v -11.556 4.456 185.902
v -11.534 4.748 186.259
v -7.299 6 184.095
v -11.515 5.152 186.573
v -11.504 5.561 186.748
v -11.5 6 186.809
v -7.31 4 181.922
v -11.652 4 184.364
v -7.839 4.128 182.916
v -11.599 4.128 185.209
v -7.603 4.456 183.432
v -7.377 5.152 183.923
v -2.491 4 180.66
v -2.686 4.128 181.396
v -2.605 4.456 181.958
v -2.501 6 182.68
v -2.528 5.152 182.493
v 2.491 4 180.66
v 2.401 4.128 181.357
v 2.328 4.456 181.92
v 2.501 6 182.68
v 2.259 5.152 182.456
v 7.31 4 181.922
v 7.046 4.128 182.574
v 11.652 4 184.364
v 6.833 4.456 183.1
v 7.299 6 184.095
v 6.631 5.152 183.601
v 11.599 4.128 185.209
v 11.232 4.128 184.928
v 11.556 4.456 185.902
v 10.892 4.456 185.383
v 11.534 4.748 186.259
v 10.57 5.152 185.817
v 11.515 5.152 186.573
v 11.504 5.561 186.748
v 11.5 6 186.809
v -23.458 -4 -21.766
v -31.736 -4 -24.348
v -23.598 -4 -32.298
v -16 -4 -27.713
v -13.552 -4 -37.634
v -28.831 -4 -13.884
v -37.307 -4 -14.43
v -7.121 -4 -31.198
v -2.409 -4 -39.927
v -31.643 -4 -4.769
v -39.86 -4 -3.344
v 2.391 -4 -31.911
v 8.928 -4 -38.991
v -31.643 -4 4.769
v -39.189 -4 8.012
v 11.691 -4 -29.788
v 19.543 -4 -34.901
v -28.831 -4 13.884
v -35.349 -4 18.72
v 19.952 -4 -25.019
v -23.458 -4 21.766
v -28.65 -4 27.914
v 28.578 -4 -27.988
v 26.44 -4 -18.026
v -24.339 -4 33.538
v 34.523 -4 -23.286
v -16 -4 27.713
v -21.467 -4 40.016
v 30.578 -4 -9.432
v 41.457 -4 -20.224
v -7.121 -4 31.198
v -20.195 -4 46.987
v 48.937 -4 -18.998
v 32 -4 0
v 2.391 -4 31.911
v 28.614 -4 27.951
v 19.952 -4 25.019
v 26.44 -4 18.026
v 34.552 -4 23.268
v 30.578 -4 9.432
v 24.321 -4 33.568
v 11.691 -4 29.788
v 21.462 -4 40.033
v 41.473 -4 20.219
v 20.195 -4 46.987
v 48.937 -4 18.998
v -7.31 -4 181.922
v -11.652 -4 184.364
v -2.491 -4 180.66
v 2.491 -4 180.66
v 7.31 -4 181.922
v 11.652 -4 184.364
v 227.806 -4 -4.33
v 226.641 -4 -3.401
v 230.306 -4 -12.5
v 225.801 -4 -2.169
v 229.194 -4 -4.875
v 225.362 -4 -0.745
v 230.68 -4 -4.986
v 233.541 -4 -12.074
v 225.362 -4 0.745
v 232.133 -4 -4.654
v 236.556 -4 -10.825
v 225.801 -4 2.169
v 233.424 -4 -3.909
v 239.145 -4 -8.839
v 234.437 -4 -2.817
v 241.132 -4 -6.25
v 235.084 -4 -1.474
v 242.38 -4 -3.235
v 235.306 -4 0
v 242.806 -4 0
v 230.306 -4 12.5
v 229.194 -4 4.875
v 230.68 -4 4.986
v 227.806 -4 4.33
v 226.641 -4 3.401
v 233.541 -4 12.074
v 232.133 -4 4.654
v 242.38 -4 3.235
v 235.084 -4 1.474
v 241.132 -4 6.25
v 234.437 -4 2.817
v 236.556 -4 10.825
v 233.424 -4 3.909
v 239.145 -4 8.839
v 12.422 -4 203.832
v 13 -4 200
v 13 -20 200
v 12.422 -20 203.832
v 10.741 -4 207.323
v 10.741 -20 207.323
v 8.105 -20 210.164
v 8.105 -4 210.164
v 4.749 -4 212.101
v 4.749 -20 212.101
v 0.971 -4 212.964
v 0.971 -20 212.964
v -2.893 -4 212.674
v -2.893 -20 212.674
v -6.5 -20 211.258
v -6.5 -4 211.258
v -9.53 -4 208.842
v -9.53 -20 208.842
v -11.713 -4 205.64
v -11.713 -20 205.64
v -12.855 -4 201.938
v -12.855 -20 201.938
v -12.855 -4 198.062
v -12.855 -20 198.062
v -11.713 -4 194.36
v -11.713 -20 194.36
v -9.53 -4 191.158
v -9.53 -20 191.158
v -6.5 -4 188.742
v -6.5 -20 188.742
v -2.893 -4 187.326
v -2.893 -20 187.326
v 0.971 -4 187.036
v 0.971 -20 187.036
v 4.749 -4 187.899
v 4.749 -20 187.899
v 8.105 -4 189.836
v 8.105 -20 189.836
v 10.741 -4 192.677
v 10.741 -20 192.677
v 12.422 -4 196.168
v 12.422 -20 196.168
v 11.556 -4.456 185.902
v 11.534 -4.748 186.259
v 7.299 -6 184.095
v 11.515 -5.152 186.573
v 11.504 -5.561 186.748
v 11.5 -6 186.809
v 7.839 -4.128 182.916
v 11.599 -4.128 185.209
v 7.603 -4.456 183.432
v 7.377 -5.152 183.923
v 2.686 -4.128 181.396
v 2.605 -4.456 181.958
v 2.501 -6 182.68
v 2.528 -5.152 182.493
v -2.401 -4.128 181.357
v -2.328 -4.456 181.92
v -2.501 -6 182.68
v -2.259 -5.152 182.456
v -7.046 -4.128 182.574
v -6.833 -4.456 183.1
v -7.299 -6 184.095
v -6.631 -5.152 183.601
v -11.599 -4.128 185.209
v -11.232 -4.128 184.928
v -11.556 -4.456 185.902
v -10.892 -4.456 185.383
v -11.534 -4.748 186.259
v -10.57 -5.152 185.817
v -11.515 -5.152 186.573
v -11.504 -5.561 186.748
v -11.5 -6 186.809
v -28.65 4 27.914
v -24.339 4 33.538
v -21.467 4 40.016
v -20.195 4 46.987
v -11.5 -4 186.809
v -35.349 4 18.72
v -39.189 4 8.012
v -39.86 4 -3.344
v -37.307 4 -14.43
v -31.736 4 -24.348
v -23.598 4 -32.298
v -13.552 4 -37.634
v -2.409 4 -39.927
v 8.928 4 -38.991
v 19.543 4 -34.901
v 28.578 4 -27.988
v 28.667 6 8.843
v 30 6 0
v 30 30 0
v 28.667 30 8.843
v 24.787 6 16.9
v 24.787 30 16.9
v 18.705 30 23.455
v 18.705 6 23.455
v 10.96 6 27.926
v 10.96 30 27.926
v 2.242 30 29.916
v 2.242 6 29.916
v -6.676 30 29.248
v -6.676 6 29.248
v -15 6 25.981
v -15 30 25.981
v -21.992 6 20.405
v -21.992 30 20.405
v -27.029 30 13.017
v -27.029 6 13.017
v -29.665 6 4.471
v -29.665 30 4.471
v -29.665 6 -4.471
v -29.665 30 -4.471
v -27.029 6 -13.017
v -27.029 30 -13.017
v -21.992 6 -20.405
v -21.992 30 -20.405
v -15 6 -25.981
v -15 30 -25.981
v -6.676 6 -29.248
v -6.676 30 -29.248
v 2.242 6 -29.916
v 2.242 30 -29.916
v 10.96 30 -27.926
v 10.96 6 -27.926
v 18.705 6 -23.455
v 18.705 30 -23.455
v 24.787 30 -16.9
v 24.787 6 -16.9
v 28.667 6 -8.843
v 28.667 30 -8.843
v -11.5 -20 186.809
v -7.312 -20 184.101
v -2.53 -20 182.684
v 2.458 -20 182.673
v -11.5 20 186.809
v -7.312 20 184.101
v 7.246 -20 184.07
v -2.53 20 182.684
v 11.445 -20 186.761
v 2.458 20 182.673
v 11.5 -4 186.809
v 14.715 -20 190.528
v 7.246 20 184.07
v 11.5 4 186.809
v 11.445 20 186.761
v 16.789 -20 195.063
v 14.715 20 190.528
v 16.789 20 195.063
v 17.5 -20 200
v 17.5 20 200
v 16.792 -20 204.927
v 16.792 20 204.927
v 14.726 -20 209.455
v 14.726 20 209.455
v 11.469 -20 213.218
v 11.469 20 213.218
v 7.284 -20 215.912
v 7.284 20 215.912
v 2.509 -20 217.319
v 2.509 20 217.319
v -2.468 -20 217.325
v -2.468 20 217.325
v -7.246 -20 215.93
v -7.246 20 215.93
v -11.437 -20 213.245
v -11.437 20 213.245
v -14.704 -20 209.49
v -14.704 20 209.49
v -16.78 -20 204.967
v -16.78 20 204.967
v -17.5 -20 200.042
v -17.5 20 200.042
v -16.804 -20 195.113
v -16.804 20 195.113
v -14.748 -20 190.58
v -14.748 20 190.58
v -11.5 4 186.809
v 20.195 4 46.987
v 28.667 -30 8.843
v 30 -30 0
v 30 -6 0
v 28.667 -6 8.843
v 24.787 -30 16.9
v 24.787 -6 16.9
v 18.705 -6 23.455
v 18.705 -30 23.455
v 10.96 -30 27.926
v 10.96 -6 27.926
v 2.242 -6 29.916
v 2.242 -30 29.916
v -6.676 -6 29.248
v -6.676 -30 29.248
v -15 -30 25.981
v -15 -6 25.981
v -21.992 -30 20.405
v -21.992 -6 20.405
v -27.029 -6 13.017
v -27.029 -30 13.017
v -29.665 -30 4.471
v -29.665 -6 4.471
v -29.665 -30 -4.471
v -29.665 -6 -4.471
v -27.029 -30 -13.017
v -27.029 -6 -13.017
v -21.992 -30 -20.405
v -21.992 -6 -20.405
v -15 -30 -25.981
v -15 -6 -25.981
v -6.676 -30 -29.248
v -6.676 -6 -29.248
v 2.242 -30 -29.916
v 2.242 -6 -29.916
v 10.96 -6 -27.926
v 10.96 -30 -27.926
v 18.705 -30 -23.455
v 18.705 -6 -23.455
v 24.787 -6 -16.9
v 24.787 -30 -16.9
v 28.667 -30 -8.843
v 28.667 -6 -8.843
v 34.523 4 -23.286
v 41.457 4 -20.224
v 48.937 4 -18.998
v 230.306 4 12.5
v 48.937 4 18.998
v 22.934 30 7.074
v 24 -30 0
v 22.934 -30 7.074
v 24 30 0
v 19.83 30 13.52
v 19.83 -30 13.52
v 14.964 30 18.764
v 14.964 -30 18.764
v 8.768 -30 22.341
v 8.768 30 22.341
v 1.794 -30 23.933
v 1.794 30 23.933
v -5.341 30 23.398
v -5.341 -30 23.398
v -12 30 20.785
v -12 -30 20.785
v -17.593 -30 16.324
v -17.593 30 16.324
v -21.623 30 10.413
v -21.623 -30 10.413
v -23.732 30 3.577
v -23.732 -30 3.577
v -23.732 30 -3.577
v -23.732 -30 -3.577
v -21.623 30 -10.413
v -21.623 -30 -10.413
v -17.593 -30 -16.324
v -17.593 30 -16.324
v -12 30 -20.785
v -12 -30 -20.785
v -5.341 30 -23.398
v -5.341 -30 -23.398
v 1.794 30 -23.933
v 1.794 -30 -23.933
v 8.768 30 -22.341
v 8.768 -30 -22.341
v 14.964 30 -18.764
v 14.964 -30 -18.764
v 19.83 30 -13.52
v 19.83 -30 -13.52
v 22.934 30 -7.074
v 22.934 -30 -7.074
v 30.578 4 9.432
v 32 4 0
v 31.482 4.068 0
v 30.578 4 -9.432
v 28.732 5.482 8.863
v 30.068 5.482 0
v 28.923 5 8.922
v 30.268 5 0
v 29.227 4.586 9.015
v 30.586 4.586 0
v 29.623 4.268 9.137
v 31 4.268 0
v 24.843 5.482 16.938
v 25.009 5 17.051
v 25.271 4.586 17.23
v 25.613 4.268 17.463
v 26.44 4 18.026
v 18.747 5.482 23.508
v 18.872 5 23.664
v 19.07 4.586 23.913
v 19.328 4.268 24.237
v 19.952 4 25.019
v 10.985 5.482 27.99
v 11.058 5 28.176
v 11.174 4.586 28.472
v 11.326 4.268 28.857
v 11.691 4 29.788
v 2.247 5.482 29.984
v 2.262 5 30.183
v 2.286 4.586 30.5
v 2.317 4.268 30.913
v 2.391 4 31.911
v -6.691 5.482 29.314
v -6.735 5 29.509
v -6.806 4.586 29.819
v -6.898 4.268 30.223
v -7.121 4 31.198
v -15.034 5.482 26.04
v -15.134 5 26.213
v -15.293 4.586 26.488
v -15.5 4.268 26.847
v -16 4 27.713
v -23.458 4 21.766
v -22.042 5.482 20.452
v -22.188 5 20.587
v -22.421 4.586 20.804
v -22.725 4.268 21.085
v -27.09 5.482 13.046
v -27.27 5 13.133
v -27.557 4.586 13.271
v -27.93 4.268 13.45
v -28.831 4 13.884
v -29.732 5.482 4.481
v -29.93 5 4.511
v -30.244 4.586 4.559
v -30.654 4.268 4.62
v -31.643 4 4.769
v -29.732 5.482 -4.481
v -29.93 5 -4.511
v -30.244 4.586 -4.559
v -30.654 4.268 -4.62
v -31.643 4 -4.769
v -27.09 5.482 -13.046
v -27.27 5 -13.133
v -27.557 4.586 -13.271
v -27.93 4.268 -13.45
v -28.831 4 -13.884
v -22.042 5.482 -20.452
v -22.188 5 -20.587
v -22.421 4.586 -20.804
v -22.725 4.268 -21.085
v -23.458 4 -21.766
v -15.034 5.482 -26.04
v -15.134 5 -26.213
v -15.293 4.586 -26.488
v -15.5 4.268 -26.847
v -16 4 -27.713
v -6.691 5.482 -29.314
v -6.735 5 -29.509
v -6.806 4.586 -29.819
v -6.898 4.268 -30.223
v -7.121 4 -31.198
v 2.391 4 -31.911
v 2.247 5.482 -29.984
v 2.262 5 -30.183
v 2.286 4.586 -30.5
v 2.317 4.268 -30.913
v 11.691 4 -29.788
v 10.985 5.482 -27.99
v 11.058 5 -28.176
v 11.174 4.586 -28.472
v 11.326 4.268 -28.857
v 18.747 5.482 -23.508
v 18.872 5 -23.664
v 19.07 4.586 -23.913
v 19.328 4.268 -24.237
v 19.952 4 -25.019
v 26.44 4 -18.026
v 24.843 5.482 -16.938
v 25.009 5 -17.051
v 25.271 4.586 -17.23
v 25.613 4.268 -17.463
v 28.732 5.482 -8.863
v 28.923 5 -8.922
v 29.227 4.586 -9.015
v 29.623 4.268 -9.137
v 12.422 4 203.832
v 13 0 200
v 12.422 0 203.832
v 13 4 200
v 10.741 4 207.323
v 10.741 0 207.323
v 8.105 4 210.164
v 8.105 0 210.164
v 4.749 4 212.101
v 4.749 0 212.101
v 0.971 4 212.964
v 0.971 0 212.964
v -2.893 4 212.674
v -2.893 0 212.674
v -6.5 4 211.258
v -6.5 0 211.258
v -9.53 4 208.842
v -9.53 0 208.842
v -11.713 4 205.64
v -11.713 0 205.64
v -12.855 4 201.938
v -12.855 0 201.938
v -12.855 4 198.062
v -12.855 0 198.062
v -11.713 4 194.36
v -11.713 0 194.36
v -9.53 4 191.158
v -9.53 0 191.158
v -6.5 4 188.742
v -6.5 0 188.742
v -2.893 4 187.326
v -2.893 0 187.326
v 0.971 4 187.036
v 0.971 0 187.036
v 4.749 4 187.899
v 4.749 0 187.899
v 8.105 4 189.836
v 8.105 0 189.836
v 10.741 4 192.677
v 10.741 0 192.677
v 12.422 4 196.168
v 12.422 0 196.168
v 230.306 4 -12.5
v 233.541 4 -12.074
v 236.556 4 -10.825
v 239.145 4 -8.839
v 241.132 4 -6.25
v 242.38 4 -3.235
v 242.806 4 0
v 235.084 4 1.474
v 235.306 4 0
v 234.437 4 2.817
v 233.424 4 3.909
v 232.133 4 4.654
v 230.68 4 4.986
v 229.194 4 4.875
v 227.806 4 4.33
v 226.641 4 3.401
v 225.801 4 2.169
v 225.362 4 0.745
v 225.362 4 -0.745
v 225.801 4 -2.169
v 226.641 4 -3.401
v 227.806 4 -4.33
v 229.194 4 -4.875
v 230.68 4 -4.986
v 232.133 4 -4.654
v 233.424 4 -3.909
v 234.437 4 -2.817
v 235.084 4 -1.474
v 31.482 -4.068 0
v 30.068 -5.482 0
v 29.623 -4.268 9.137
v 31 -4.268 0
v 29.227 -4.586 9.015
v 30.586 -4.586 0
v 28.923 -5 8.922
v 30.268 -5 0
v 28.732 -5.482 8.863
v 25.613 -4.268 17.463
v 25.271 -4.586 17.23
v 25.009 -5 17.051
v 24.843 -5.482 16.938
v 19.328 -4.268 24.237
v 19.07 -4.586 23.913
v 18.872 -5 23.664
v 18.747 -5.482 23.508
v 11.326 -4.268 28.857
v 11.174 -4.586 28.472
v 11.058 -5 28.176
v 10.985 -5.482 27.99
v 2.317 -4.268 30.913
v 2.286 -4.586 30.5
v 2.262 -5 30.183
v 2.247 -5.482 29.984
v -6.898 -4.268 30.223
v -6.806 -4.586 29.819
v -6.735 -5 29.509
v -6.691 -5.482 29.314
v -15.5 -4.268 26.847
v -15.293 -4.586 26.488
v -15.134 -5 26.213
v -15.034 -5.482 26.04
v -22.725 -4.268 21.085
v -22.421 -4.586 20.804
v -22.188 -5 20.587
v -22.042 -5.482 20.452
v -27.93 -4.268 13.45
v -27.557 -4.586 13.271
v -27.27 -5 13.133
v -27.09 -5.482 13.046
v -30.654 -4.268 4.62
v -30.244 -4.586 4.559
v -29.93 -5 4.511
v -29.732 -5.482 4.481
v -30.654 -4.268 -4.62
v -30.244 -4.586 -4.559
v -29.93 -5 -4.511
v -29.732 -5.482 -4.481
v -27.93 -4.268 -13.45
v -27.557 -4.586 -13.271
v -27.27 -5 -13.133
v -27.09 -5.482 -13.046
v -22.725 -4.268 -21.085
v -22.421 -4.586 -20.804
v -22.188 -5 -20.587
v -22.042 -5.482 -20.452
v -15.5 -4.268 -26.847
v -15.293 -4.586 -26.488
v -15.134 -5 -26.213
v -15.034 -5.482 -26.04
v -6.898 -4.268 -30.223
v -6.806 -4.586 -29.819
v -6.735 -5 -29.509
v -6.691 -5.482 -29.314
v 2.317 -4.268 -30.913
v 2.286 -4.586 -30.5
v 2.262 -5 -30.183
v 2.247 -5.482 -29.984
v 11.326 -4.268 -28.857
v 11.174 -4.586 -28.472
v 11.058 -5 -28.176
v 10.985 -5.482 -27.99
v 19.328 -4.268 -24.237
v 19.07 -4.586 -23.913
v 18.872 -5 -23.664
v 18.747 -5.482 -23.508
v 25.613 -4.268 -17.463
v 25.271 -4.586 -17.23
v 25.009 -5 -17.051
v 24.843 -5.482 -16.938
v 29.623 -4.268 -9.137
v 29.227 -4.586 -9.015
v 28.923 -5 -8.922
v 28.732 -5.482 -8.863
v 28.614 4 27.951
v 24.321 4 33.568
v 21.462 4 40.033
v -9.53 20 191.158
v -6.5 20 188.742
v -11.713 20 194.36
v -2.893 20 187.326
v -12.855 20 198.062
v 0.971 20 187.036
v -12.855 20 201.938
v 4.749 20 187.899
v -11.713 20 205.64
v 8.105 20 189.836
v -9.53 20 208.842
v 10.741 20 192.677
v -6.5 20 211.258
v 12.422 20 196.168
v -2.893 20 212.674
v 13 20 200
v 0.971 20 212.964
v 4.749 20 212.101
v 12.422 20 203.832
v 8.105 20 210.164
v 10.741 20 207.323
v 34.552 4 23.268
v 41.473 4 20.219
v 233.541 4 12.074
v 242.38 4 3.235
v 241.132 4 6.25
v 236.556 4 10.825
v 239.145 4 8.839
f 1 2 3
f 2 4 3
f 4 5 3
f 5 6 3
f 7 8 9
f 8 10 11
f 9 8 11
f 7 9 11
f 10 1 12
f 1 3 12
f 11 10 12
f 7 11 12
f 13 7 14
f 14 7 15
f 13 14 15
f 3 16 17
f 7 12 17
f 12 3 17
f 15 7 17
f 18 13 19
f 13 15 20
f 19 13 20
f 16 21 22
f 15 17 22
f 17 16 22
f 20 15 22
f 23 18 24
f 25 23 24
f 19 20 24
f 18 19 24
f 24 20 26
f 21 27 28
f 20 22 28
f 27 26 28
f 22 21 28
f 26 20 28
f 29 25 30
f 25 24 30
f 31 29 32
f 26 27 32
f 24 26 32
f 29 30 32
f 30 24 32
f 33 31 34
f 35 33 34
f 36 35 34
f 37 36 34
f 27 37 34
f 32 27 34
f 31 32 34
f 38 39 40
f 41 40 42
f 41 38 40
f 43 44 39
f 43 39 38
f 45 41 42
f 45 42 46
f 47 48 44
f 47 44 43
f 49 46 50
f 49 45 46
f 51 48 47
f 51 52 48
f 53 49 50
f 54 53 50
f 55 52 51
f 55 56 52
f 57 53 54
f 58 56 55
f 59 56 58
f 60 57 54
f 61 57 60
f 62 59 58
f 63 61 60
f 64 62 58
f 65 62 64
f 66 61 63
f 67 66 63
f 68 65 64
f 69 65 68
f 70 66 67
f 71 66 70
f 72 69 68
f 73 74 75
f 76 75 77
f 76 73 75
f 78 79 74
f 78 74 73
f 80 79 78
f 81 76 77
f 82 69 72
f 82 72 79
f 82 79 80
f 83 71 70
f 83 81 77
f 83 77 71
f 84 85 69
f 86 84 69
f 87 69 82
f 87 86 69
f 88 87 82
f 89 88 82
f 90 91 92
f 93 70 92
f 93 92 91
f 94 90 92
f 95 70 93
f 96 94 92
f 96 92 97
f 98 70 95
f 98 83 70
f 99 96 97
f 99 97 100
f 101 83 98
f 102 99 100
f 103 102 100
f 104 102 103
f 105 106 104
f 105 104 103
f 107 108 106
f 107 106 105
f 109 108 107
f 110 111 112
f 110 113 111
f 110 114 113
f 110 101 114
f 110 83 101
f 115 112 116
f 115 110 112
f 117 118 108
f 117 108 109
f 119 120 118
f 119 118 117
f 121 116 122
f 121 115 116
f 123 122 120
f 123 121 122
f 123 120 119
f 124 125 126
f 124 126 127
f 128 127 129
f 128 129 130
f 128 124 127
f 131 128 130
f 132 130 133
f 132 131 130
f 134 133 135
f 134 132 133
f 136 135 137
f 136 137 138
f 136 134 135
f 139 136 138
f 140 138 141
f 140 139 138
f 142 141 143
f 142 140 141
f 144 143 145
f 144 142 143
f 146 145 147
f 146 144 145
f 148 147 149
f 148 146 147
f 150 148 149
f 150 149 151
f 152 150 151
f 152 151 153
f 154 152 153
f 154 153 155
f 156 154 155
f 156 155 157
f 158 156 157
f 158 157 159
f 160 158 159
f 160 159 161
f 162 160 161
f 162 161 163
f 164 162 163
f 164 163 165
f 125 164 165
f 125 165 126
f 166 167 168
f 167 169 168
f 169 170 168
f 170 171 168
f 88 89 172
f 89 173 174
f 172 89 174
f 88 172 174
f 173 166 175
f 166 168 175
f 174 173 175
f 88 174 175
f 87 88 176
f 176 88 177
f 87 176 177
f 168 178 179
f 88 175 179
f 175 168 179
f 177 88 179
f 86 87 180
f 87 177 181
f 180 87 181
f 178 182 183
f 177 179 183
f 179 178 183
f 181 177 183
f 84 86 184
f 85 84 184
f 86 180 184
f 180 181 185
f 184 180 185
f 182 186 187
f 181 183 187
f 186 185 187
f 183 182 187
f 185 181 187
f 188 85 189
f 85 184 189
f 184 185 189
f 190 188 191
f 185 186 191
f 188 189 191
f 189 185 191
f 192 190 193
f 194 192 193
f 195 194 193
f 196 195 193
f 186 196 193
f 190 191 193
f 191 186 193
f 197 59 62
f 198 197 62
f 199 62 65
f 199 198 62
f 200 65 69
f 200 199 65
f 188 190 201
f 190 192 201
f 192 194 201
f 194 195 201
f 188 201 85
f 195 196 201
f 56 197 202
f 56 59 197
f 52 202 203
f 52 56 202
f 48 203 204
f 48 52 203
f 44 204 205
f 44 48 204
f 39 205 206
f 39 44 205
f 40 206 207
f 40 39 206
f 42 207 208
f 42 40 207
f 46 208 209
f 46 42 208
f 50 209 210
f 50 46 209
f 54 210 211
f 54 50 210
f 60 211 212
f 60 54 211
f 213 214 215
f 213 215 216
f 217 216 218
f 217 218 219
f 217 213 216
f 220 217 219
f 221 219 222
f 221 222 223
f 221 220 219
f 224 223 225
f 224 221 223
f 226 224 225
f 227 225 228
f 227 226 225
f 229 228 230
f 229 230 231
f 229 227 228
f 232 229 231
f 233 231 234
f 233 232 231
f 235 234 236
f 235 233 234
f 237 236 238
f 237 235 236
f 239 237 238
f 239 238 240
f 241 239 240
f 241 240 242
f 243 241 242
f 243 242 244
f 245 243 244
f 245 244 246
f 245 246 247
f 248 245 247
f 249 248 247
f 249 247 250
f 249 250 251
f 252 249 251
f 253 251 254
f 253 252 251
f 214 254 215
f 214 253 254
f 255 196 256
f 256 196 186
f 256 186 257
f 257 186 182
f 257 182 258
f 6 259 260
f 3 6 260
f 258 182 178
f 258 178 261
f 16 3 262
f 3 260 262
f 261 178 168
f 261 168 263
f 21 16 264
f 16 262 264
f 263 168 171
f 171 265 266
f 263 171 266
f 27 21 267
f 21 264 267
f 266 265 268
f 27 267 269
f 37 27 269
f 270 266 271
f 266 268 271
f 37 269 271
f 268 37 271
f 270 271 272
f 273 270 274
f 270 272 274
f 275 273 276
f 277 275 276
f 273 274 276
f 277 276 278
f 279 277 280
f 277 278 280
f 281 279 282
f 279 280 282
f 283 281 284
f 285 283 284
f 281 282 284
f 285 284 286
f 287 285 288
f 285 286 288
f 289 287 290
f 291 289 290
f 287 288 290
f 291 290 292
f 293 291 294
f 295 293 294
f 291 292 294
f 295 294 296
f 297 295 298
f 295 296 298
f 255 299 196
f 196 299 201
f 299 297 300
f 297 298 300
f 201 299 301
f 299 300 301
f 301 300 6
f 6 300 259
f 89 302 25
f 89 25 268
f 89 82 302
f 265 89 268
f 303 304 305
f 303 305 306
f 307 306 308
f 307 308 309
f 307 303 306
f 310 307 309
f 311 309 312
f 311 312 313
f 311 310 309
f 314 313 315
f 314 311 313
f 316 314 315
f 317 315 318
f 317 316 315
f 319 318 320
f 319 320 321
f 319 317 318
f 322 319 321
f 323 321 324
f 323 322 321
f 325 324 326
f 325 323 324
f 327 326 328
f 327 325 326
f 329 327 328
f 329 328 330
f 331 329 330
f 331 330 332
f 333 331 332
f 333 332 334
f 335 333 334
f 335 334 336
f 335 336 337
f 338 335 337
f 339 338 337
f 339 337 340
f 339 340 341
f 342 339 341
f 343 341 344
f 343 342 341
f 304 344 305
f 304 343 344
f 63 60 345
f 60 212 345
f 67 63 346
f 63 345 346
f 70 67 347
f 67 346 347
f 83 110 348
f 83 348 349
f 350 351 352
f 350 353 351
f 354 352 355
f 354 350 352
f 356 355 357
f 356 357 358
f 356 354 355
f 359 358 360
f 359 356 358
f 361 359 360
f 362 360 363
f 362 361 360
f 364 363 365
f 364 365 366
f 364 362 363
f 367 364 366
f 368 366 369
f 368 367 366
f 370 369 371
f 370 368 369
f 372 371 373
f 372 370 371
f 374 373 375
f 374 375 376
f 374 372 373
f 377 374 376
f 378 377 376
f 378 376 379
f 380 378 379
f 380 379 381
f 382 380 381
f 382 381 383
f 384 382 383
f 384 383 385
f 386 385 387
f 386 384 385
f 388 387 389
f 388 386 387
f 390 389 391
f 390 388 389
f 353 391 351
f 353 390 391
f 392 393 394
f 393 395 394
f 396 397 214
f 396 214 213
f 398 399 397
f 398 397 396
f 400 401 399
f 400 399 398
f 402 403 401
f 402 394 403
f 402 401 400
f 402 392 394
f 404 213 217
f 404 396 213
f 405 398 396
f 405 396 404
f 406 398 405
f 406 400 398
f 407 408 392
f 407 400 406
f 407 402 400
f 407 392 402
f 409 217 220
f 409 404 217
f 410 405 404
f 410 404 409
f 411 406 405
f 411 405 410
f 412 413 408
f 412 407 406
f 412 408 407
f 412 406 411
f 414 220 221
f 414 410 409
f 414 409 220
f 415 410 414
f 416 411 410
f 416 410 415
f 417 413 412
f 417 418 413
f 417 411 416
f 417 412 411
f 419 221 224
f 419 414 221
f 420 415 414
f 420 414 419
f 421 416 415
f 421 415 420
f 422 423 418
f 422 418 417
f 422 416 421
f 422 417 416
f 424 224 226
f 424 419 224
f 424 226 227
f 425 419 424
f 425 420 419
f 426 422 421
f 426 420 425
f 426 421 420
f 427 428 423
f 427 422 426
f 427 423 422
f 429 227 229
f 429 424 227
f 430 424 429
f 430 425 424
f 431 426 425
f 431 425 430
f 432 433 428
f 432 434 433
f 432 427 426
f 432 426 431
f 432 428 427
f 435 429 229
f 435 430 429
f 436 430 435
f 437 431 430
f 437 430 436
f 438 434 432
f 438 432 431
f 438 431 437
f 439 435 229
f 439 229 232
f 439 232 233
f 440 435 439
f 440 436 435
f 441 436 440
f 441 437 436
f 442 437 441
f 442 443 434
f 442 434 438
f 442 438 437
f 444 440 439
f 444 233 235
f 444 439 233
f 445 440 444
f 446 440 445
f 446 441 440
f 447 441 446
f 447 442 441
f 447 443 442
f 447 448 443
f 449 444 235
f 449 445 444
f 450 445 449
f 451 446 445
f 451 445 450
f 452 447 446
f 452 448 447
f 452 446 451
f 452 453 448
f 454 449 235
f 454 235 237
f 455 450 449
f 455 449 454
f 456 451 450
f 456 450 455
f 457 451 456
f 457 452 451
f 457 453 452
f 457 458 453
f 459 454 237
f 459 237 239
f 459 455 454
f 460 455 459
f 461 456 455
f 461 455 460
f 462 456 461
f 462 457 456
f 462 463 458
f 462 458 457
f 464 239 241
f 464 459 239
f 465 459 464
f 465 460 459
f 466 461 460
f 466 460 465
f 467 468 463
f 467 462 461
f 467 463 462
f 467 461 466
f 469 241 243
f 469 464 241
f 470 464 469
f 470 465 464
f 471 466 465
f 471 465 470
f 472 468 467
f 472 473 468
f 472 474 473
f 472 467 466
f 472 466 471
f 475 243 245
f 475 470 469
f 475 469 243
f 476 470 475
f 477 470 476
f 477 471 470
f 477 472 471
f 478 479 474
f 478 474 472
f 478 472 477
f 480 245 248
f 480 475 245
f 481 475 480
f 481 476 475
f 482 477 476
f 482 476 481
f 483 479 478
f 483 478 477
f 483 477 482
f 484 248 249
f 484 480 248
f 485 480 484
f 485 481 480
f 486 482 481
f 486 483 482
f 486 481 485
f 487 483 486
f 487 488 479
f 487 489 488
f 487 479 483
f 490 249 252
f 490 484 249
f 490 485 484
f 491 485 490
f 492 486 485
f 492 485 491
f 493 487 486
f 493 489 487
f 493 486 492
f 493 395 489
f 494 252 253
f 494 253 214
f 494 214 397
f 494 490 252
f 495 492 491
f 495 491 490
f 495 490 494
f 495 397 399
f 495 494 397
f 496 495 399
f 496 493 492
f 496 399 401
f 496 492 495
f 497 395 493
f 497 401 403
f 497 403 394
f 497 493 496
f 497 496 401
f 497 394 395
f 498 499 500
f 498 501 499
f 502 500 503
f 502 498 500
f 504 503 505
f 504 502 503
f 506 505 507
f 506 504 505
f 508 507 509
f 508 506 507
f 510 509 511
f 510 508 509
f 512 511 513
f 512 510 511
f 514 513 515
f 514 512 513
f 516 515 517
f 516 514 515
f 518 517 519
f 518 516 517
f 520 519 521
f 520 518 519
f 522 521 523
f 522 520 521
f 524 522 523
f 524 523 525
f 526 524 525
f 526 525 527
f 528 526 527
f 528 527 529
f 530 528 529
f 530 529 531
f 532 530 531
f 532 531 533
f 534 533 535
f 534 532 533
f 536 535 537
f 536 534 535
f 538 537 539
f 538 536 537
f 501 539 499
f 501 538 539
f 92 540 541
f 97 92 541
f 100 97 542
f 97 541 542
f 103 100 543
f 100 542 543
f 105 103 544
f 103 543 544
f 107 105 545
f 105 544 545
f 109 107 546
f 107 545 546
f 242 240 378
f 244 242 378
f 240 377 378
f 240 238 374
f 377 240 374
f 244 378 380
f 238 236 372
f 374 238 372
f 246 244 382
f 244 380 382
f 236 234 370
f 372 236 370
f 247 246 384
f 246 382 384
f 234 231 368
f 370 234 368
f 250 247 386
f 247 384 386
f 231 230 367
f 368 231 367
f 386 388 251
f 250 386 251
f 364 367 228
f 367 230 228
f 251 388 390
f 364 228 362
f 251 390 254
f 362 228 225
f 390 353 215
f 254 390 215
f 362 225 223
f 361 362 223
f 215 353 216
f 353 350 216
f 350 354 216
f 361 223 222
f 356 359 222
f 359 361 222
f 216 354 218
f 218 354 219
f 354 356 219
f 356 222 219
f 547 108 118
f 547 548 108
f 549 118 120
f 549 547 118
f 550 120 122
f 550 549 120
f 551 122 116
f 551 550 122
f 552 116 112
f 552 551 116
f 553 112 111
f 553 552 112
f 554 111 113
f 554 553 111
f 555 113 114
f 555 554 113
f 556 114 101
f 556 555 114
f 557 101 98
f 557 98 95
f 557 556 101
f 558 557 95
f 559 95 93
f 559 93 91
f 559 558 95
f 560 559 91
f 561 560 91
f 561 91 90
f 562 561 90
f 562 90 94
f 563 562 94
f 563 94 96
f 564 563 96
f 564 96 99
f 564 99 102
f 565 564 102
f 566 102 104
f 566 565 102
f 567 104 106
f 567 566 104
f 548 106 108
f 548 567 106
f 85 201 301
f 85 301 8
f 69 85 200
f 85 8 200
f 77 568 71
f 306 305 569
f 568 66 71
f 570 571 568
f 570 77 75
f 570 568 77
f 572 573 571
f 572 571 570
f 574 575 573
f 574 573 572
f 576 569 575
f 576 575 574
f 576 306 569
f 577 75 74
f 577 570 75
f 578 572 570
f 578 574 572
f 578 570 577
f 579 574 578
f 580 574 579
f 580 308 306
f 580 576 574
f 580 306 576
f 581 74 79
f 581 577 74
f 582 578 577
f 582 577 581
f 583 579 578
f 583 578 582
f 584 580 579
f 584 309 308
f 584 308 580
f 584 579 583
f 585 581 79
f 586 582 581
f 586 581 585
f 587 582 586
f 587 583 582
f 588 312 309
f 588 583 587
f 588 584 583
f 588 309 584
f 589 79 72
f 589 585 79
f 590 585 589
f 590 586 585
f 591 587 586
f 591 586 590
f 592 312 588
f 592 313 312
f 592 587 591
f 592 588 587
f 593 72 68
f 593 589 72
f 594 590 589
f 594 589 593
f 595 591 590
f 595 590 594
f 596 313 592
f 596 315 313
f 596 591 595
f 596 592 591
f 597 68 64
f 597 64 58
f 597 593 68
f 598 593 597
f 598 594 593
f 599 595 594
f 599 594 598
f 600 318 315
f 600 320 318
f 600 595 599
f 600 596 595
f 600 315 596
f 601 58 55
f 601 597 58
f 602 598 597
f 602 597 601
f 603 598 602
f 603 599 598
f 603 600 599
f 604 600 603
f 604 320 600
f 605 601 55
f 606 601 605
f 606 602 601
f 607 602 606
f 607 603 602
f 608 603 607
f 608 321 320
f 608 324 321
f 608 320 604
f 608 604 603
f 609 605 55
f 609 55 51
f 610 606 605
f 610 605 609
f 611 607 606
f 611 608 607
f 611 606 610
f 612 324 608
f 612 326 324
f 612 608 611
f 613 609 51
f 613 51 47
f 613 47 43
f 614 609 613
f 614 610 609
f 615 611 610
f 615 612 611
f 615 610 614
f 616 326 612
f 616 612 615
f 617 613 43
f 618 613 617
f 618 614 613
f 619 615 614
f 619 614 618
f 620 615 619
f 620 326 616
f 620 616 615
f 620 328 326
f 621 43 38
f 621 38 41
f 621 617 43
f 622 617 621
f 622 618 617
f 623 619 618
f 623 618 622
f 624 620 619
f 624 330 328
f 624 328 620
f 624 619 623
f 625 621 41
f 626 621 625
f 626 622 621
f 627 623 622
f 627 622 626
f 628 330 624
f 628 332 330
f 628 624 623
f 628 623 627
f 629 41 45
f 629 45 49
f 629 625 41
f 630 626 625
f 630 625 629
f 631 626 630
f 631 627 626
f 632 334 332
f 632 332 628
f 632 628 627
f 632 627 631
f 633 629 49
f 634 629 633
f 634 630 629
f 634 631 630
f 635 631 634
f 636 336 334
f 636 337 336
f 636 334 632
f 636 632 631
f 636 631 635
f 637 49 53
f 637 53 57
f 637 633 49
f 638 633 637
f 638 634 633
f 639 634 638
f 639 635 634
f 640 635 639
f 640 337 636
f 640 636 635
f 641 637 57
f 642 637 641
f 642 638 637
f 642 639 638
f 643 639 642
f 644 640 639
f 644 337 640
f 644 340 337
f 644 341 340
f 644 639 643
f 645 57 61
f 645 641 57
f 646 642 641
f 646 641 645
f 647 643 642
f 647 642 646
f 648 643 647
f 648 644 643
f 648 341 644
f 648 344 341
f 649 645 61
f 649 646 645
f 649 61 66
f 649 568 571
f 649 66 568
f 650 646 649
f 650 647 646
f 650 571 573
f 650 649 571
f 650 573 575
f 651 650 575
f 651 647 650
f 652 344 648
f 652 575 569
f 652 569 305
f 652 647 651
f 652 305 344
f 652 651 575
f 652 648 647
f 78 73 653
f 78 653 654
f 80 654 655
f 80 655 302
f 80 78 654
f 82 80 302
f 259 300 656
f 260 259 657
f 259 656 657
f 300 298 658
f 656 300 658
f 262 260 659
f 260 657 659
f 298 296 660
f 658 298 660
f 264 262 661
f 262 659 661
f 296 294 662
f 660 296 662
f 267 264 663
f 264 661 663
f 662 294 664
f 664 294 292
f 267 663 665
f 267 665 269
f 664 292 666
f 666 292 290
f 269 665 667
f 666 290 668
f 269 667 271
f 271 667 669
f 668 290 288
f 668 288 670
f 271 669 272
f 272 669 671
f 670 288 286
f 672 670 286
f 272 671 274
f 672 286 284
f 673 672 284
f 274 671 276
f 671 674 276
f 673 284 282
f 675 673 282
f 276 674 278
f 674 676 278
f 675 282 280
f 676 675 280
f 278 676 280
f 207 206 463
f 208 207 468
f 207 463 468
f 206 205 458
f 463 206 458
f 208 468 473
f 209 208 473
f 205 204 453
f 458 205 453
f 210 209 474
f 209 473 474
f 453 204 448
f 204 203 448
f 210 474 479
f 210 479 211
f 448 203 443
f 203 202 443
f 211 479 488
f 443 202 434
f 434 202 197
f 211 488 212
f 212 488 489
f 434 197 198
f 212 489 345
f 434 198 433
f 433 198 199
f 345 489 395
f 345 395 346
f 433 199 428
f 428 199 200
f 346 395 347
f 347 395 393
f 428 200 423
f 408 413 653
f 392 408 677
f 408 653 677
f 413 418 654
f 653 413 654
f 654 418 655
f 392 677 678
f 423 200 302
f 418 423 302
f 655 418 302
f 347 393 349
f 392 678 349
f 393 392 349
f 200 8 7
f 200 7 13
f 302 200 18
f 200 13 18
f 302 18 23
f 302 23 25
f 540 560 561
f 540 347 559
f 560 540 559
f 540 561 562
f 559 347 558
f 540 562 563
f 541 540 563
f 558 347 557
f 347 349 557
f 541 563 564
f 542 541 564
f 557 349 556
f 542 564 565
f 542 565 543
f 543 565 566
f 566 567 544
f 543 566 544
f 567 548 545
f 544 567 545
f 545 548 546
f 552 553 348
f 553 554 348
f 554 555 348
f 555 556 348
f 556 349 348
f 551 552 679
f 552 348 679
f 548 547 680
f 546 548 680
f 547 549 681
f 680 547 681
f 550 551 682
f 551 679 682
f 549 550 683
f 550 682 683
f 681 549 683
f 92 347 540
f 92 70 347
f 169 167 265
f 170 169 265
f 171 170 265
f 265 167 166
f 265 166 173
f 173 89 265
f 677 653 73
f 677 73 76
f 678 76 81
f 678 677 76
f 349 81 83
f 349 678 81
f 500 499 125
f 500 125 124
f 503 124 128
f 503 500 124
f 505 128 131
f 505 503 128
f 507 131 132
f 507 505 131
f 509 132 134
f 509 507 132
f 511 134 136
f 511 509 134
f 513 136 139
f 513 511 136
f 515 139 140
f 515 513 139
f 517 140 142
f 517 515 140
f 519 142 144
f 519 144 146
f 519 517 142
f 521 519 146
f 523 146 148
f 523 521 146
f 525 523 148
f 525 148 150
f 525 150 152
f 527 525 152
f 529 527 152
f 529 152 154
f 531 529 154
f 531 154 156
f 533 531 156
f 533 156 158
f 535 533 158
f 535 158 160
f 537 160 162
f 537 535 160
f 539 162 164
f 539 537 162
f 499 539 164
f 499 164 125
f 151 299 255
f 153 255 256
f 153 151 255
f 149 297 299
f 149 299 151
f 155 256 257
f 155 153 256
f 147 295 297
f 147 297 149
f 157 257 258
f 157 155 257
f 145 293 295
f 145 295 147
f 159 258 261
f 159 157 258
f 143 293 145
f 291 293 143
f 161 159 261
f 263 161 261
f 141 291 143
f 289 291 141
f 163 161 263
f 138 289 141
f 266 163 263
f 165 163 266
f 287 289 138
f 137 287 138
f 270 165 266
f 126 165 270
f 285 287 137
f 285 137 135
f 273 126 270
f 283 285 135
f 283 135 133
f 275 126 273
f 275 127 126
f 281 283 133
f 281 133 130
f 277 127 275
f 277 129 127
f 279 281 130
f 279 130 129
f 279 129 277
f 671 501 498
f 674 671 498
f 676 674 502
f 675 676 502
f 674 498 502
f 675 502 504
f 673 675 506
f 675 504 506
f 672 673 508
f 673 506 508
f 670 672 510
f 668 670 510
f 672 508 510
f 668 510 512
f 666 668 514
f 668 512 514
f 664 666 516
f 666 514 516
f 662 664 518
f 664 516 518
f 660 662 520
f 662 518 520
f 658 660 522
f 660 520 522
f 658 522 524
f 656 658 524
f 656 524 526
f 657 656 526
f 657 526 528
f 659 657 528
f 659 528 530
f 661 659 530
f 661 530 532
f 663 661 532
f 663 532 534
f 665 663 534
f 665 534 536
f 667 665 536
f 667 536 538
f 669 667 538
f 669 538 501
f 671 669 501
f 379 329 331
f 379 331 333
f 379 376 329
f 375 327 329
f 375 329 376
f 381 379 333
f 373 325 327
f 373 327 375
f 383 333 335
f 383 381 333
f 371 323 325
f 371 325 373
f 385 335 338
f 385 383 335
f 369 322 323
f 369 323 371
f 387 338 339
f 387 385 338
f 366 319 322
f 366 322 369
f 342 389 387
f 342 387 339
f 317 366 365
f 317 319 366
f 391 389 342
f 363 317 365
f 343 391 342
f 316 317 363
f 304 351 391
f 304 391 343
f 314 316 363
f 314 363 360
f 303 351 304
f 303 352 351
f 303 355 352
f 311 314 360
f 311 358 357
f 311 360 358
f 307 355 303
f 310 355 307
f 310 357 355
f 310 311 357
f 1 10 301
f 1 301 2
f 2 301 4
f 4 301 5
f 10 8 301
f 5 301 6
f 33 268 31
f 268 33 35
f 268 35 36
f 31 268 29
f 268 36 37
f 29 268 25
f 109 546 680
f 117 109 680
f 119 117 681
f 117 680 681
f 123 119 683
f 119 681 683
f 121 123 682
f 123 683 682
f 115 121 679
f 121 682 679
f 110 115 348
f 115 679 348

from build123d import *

# Parameters (mm, degrees)
F0_R          = 30
F0_R_2        = 5
F0_R_3        = 13
F1_DEPTH      = 4
F2_R          = 30
F3_T1_DEPTH   = 8
F4_R          = 30
F5_R          = 30
F7_DEPTH      = 20
F6_R          = 30
F6_R_2        = 24
F8_DEPTH      = 30
F9_R          = 2
F10_T4_ANGLE  = 114.9160729666
F10_T10_ANGLE = 114.9160729666


# Not quite as in the source:
# - a fillet or chamfer that OpenCascade refuses, or shapes differently, is made with other operations: its cross-section is extruded or revolved along the edge and cut away or added


with BuildPart() as f1:
    # F0 (on Front) → F1 (new body, symmetric)
    with BuildSketch(Plane.XZ):
        with BuildLine():
            ThreePointArc((34.9249194702, -19.5), (38.7104428986, -10.074800772), (40, 0))
            ThreePointArc((40, 0), (38.7104428986, 10.074800772), (34.9249194702, 19.5))
            ThreePointArc((34.9249194702, 19.5), (28.892590505, 27.6625778609), (21, 34.0440890611))
            ThreePointArc((21, 34.0440890611), (0, 40), (-21, 34.0440890611))
            ThreePointArc((-21, 34.0440890611), (-27.6625778609, -28.892590505), (34.9249194702, -19.5))
        make_face()
        Circle(F0_R, mode=Mode.SUBTRACT)
        with BuildLine():
            ThreePointArc((34.9249194702, 19.5), (38.7104428986, 10.074800772), (40, 0))
            ThreePointArc((40, 0), (38.7104428986, -10.074800772), (34.9249194702, -19.5))
            Line((34.9249194702, -19.5), (230.3062081337, -12.5))
            ThreePointArc((230.3062081337, -12.5), (217.8062081337, 0), (230.3062081337, 12.5))
            Line((230.3062081337, 12.5), (34.9249194702, 19.5))
        make_face()
        with BuildLine():
            ThreePointArc((-21, 34.0440890611), (0, 40), (21, 34.0440890611))
            Line((21, 34.0440890611), (11.5, 186.8090940417))
            ThreePointArc((11.5, 186.8090940417), (0, 182.5), (-11.5, 186.8090940417))
            Line((-11.5, 186.8090940417), (-21, 34.0440890611))
        make_face()
        with BuildLine():
            ThreePointArc((242.8062081337, 0), (239.1450428985, 8.8388347648), (230.3062081337, 12.5))
            ThreePointArc((230.3062081337, 12.5), (217.8062081337, 0), (230.3062081337, -12.5))
            ThreePointArc((230.3062081337, -12.5), (239.1450428985, -8.8388347648), (242.8062081337, 0))
        make_face()
        with Locations((230.3062081337, 0)):
            Circle(F0_R_2, mode=Mode.SUBTRACT)
        with BuildLine():
            ThreePointArc((-11.5, 186.8090940417), (0, 182.5), (11.5, 186.8090940417))
            ThreePointArc((11.5, 186.8090940417), (15.9295323221, 192.7543116269), (17.5, 200))
            ThreePointArc((17.5, 200), (-7.2456883731, 215.9295323221), (-11.5, 186.8090940417))
        make_face()
        with Locations((0, 200)):
            Circle(F0_R_3, mode=Mode.SUBTRACT)
    extrude(amount=F1_DEPTH, both=True)

    # F2
    f2_edges = [f1.edges().sort_by_distance(p)[0] for p in [
        (21, 0, 34.044089),
    ]]
    fillet(f2_edges, radius=F2_R)

    # F3: fillet of radius 30 on 1 edges, made by hand

    # F3_s2 → F3_t1 (join)
    with BuildSketch(Plane.XZ.offset(-4)):
        with BuildLine():
            ThreePointArc((28.5776054959, 27.9878628002), (37.8926630157, 21.5351718891), (48.9366773254, 18.9979954035))
            Line((48.9366773254, 18.9979954035), (34.9249194702, 19.5))
            ThreePointArc((34.9249194702, 19.5), (32.033632685, 23.9550908369), (28.5776054959, 27.9878628002))
        make_face()
    extrude(amount=F3_T1_DEPTH)

    # F4
    f4_edges = [f1.edges().sort_by_distance(p)[0] for p in [
        (-21, 0, 34.044089),
    ]]
    fillet(f4_edges, radius=F4_R)

    # F5
    f5_edges = [f1.edges().sort_by_distance(p)[0] for p in [
        (34.924919, 0, -19.5),
    ]]
    fillet(f5_edges, radius=F5_R)

    # F0 (on Front) → F7 (join, symmetric)
    with BuildSketch(Plane.XZ):
        with BuildLine():
            ThreePointArc((-11.5, 186.8090940417), (0, 182.5), (11.5, 186.8090940417))
            ThreePointArc((11.5, 186.8090940417), (15.9295323221, 192.7543116269), (17.5, 200))
            ThreePointArc((17.5, 200), (-7.2456883731, 215.9295323221), (-11.5, 186.8090940417))
        make_face()
        with Locations((0, 200)):
            Circle(F0_R_3, mode=Mode.SUBTRACT)
    extrude(amount=F7_DEPTH, both=True)

    # F6 (on Front) → F8 (join, symmetric)
    with BuildSketch(Plane.XZ):
        Circle(F6_R)
        Circle(F6_R_2, mode=Mode.SUBTRACT)
    extrude(amount=F8_DEPTH, both=True)

    # F9
    f9_edges = [f1.edges().sort_by_distance(p)[0] for p in [
        (-30, -4, 0),
        (-30, 4, 0),
    ]]
    fillet(f9_edges, radius=F9_R)

    # F10: fillet of radius 2 on 2 edges, made by hand


with BuildPart() as f10_tool2:
    # F10_s3 → F10_t4 (revolve)
    with BuildSketch(Plane(origin=(-90.6925867032, 0, 142.1290246396), x_dir=(0, 1, 0), z_dir=(-0.5379171654, 0, 0.8429977006))):
        with BuildLine():
            ThreePointArc((4, -88.0834330744), (4.5857864376, -89.4976466368), (6, -90.0834330744))
            Line((6, -90.0834330744), (4, -90.0834330744))
            Line((4, -90.0834330744), (4, -88.0834330744))
        make_face()
    revolve(axis=Axis((0, 4, 200), (0, -1, 0)), revolution_arc=F10_T4_ANGLE)

    split(bisect_by=Plane(origin=(-23.028045717, 0, 1.4320454762), x_dir=(0, 1, 0), z_dir=(0.9980719777, 0, -0.0620671193)), keep=Keep.TOP)

    split(bisect_by=Plane(origin=(23.028045717, 0, 1.4320454762), x_dir=(0, 1, 0), z_dir=(-0.9980719777, 0, -0.0620671193)), keep=Keep.TOP)


with BuildPart() as f1_1:
    add(f1.part)

    # F10_t1: union F10_tool2
    add(f10_tool2.part)


with BuildPart() as f10_tool8:
    # F10_s9 → F10_t10 (revolve)
    with BuildSketch(Plane(origin=(90.6925867032, 0, 142.1290246396), x_dir=(0, 1, 0), z_dir=(0.5379171654, 0, 0.8429977006))):
        with BuildLine():
            ThreePointArc((-4, 88.0834330744), (-4.5857864376, 89.4976466368), (-6, 90.0834330744))
            Line((-6, 90.0834330744), (-4, 90.0834330744))
            Line((-4, 90.0834330744), (-4, 88.0834330744))
        make_face()
    revolve(axis=Axis((0, -4, 200), (0, 1, 0)), revolution_arc=F10_T10_ANGLE)

    split(bisect_by=Plane(origin=(-23.028045717, 0, 1.4320454762), x_dir=(0, 1, 0), z_dir=(0.9980719777, 0, -0.0620671193)), keep=Keep.TOP)

    split(bisect_by=Plane(origin=(23.028045717, 0, 1.4320454762), x_dir=(0, 1, 0), z_dir=(-0.9980719777, 0, -0.0620671193)), keep=Keep.TOP)


with BuildPart() as f1_2:
    add(f1_1.part)

    # F10_t7: union F10_tool8
    add(f10_tool8.part)


solid = f1_2.part
